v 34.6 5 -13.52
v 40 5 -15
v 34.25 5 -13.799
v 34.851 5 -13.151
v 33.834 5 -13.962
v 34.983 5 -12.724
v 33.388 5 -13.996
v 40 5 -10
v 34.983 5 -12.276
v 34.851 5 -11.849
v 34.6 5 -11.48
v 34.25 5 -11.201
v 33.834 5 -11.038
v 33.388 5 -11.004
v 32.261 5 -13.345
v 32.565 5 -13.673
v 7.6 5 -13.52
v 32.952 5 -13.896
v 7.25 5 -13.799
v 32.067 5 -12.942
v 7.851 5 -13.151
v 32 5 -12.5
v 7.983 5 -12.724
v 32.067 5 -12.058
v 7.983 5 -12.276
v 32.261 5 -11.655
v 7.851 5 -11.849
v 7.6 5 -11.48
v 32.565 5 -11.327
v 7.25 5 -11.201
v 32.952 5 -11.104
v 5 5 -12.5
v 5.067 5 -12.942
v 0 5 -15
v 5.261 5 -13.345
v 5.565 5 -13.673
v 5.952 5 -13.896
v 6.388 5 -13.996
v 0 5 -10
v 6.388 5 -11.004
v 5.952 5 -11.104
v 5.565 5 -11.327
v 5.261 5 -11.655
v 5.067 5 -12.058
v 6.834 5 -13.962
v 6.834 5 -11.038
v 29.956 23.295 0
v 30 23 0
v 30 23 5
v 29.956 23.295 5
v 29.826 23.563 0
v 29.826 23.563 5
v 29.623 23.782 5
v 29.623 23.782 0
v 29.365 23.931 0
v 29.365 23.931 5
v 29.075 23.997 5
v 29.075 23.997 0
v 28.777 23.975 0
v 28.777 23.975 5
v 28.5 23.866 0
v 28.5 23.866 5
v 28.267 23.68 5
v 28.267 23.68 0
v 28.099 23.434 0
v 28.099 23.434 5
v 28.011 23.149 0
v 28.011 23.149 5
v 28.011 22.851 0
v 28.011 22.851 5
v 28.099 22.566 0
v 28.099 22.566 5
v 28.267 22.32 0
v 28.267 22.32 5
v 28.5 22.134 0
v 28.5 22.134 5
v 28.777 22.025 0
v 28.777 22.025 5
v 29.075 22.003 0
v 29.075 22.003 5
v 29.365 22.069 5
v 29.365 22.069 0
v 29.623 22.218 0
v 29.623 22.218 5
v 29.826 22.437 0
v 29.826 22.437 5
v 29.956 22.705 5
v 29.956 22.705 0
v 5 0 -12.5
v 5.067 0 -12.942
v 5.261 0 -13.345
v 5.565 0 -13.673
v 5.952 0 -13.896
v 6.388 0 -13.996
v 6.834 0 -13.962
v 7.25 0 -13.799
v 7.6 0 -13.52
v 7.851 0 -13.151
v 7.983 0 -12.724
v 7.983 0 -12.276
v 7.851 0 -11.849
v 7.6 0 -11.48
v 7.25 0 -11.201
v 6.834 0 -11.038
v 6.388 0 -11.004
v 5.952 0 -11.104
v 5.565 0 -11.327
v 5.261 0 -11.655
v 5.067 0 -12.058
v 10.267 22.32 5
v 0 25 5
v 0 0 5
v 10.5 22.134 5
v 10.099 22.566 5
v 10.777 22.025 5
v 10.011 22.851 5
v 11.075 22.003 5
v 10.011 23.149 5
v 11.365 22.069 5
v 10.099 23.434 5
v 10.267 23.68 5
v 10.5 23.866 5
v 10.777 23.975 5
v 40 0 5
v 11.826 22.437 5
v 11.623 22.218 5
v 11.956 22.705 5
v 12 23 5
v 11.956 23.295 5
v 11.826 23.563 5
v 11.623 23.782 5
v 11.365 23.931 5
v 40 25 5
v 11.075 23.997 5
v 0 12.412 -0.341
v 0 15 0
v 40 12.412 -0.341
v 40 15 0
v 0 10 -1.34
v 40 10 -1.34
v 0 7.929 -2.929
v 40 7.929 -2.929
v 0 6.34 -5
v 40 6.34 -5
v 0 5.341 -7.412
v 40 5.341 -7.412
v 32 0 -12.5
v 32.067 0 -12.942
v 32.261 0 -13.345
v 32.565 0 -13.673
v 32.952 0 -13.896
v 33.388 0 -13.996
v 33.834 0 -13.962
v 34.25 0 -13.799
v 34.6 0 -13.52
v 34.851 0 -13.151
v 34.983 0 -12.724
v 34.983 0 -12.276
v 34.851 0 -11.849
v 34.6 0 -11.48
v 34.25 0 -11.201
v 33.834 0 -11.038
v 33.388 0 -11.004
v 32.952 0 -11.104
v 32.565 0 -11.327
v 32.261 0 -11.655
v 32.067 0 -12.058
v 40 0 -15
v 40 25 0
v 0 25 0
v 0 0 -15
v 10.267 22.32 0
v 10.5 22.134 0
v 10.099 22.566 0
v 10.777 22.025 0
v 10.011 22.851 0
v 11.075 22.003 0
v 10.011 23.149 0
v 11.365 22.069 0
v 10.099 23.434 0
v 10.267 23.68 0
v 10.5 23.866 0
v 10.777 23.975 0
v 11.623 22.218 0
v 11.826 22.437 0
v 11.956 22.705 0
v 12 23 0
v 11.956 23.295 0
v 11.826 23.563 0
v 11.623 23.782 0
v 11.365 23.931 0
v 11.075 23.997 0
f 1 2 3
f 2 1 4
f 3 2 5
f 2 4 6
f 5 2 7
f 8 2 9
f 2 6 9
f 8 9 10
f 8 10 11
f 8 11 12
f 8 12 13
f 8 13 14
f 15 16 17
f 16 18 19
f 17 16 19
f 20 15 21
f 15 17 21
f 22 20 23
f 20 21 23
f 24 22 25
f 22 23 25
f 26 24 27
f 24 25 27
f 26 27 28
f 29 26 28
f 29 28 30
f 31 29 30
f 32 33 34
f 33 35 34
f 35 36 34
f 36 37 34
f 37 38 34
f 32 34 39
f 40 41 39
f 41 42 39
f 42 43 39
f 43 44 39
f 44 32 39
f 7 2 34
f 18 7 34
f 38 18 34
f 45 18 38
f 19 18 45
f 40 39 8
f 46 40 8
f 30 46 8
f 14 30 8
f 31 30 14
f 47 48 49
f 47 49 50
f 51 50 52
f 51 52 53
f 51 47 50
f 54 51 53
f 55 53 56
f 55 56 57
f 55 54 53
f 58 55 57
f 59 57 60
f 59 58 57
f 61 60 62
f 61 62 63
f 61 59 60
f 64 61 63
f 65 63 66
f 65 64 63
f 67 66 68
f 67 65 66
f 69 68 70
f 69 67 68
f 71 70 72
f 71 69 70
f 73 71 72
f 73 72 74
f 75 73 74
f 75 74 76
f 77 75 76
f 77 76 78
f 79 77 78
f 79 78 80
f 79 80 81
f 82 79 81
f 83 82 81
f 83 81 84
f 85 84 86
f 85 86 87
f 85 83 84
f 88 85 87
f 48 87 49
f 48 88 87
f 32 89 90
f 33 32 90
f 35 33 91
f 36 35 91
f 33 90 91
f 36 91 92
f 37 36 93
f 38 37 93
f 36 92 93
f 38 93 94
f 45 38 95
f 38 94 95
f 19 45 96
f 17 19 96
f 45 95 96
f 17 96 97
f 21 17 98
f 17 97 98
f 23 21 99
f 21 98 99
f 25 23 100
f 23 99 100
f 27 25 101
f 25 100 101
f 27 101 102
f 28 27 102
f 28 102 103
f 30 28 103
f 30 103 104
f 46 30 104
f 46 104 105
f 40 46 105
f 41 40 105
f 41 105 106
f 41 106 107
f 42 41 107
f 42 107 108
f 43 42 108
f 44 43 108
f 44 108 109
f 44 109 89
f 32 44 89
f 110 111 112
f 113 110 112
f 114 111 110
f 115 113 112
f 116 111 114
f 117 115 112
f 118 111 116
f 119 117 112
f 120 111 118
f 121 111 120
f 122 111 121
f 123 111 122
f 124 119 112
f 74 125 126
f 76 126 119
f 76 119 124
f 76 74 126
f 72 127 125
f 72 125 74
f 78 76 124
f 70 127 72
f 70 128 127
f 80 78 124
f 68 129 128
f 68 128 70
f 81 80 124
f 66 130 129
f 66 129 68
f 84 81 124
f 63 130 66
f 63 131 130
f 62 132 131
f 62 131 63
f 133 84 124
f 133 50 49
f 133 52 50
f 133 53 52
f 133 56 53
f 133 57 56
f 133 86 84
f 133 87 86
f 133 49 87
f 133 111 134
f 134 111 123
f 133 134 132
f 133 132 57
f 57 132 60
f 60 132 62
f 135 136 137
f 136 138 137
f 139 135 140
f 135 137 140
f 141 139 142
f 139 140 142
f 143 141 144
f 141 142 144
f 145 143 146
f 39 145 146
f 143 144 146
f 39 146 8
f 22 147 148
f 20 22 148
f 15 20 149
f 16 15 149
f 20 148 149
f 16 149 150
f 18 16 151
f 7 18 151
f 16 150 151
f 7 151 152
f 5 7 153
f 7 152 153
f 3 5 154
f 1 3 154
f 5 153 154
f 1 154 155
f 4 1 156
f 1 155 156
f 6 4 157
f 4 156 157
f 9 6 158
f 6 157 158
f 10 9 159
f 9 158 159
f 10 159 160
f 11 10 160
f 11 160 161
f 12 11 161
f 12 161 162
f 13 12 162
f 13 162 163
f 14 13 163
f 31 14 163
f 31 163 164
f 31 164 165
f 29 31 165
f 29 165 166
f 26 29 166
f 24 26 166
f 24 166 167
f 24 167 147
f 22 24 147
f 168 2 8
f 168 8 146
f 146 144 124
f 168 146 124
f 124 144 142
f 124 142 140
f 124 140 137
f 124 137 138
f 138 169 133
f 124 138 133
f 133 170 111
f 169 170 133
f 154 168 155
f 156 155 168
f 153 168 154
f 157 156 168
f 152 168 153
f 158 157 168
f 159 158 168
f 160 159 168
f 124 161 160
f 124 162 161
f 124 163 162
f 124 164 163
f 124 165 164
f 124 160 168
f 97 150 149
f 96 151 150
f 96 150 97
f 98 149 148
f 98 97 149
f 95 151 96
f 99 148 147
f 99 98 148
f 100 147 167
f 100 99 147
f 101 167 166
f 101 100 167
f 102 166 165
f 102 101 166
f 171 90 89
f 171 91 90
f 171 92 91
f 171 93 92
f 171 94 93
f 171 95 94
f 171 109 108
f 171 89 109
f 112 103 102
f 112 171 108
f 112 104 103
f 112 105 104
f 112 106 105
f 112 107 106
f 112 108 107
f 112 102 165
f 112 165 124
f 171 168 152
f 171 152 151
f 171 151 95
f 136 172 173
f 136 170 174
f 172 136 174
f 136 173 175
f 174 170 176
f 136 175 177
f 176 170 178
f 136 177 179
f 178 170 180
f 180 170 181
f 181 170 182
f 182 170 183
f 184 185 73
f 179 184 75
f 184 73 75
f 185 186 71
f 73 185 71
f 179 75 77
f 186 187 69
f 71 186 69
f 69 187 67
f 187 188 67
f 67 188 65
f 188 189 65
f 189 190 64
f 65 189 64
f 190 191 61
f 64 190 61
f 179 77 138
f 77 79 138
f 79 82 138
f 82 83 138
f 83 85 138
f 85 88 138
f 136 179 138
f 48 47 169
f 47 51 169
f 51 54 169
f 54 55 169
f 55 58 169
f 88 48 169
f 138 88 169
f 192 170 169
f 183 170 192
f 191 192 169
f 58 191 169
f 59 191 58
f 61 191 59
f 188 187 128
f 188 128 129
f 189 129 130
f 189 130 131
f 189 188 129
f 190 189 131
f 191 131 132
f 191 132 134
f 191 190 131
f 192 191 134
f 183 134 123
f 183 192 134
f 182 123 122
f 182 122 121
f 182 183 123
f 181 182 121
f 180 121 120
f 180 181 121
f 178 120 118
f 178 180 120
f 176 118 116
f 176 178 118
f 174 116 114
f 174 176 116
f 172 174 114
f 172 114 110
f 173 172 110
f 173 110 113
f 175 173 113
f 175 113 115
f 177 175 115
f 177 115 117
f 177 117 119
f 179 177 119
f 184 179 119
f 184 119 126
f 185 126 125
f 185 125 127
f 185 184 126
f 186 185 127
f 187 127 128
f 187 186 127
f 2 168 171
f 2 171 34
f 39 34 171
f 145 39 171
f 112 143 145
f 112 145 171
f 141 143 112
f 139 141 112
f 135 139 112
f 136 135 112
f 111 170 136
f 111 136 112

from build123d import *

# Parameters (mm, degrees)
SKETCH1_W           = 40
SKETCH1_H           = 25
SKETCH1_R           = 1
BOSS_EXTRUDE1_DEPTH = 5
SKETCH2_W           = 15
SKETCH2_H           = 5
BOSS_EXTRUDE2_DEPTH = 40
FILLET2_R           = 10
SKETCH8_R           = 1.5
CUT_EXTRUDE1_DEPTH  = 40


with BuildPart() as part:
    # Sketch1 → Boss-Extrude1 (new body)
    with BuildSketch(Plane.XY):
        with Locations((20, 12.5)):
            Rectangle(SKETCH1_W, SKETCH1_H)
        with Locations((11, 23)):
            Circle(SKETCH1_R, mode=Mode.SUBTRACT)
        with Locations((29, 23)):
            Circle(SKETCH1_R, mode=Mode.SUBTRACT)
    extrude(amount=BOSS_EXTRUDE1_DEPTH)

    # Sketch2 → Boss-Extrude2 (add)
    with BuildSketch(Plane.ZY):
        with Locations((-7.5, 2.5)):
            Rectangle(SKETCH2_W, SKETCH2_H)
    extrude(amount=-BOSS_EXTRUDE2_DEPTH)

    # Fillet2
    fillet2_edges = [part.edges().sort_by_distance(p)[0] for p in [
        (20, 5, 0),
    ]]
    fillet(fillet2_edges, radius=FILLET2_R)

    # Sketch8 → Cut-Extrude1 (cut)
    with BuildSketch(Plane(origin=(0, 0, 0), x_dir=(-1, 0, 0), z_dir=(0, -1, 0))):
        with Locations((-6.5, 12.5)):
            Circle(SKETCH8_R)
        with Locations((-33.5, 12.5)):
            Circle(SKETCH8_R)
    extrude(amount=-CUT_EXTRUDE1_DEPTH, mode=Mode.SUBTRACT)


solid = part.part
